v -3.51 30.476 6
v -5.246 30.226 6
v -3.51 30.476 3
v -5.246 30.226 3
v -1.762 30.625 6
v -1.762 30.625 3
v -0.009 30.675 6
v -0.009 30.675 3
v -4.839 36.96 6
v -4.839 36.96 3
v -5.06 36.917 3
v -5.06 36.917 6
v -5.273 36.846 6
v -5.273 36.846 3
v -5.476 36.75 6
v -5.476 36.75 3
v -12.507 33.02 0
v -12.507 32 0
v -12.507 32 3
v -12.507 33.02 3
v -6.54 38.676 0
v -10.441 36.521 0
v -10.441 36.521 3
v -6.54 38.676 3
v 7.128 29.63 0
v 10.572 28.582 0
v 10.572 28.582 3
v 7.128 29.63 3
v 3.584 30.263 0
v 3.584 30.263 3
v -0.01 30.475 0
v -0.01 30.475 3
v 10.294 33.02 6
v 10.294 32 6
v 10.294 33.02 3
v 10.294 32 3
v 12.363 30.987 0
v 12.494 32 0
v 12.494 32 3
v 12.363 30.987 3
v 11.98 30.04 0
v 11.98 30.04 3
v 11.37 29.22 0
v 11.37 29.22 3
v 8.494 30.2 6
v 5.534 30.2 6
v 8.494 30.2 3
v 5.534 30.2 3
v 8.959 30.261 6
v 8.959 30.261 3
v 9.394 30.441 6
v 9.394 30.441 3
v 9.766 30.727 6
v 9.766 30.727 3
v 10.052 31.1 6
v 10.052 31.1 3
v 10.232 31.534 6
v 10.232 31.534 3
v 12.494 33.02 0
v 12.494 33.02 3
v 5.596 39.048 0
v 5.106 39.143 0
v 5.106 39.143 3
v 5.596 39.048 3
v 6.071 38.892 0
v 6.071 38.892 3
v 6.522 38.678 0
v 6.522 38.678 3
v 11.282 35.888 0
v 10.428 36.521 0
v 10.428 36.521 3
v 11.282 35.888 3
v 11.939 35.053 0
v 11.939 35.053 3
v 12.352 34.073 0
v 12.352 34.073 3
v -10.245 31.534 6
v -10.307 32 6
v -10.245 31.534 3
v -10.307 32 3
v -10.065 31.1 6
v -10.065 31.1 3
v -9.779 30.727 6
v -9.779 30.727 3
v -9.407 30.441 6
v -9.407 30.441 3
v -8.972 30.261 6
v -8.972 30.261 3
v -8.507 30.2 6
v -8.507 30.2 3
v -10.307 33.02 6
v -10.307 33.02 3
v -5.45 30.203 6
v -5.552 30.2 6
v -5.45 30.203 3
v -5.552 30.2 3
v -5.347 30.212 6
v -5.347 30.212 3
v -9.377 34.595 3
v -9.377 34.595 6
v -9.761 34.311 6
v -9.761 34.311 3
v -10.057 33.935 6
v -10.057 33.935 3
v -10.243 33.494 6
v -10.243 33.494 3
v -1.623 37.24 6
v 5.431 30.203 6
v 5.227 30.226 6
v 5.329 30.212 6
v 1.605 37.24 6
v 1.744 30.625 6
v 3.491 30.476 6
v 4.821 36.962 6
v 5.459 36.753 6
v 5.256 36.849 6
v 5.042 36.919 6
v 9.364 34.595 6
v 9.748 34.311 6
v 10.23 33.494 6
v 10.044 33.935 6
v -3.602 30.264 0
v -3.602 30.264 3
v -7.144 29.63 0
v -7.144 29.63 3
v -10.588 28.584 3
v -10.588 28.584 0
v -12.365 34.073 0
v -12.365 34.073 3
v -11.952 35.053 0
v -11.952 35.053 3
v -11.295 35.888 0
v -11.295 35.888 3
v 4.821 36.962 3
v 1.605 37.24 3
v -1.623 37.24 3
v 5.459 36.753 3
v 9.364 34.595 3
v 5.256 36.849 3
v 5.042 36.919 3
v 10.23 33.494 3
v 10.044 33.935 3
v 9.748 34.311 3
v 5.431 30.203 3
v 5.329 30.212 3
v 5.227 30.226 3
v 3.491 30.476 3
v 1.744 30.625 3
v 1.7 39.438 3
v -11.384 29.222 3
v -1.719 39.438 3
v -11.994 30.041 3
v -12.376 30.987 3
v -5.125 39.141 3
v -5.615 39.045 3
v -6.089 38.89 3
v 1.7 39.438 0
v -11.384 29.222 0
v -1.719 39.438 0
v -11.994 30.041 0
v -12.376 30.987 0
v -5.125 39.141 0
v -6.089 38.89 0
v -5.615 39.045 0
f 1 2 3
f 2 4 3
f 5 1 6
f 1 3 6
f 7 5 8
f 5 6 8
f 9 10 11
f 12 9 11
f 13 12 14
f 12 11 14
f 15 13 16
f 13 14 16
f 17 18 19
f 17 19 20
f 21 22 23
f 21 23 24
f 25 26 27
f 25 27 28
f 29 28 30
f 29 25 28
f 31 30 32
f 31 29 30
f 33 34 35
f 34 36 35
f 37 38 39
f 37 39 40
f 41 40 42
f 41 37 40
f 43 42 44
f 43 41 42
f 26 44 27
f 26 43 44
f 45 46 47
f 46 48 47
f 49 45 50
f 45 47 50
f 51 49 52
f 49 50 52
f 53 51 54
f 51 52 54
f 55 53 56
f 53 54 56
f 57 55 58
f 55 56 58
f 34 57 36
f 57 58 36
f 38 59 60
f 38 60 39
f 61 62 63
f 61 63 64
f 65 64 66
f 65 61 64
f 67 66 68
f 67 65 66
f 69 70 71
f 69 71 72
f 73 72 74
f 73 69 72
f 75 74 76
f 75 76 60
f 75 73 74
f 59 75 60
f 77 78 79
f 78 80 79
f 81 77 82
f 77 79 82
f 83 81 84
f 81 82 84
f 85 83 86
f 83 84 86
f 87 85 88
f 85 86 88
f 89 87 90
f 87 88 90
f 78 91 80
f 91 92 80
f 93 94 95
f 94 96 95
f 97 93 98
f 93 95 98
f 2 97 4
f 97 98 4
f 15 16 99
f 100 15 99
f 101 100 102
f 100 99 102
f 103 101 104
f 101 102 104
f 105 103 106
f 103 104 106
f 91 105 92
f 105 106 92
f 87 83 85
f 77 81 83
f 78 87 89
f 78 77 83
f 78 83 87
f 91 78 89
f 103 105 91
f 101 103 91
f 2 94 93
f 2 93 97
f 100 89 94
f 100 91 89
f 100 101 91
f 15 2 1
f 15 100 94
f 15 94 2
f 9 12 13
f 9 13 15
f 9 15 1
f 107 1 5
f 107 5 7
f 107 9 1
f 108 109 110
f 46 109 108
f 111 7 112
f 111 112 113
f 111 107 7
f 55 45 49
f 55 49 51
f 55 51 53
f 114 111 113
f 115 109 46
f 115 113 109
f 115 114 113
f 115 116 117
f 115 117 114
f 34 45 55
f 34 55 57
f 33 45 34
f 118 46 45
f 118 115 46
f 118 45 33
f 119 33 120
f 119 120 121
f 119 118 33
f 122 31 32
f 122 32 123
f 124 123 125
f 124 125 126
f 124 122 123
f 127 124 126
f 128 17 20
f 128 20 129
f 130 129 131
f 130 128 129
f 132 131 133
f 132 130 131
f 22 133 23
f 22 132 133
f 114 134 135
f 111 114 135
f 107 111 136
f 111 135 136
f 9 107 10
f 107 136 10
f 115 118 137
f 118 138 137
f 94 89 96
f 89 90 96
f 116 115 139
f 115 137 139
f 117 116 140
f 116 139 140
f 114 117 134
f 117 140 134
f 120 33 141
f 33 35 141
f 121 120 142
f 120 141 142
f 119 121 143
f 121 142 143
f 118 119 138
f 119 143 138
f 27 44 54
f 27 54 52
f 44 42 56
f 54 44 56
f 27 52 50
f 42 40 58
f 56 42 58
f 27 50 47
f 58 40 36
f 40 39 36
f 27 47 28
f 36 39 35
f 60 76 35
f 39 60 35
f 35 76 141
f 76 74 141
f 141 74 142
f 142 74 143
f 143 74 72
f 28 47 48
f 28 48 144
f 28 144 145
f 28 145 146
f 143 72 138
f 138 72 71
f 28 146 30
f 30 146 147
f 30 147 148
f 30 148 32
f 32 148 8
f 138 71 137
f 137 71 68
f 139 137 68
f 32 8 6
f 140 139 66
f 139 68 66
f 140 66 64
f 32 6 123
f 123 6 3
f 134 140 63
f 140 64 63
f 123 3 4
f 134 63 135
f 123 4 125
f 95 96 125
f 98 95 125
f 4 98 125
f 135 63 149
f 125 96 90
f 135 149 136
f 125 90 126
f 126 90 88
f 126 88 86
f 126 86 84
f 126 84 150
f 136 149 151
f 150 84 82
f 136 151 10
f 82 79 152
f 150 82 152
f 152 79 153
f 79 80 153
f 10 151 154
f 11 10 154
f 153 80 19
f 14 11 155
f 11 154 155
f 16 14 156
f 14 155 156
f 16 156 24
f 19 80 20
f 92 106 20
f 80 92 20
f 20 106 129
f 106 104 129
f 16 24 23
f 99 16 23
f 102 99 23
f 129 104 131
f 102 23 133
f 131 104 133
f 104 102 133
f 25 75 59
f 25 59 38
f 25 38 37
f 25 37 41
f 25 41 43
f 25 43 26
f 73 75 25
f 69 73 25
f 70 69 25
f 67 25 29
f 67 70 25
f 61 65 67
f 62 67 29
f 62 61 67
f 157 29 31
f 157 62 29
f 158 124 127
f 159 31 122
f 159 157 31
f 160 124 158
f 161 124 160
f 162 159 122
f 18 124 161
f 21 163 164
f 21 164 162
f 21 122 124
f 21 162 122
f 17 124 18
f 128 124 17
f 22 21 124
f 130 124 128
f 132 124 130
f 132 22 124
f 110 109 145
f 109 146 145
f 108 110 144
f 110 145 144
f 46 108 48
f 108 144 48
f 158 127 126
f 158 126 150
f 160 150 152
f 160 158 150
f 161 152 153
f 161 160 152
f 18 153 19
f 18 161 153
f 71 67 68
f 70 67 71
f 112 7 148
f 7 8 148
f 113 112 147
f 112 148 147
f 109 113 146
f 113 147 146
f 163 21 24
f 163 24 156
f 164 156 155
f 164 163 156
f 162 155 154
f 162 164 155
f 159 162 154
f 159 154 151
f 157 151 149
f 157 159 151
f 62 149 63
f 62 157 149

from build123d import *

# Parameters (mm, degrees)
BOSS_EXTRUDE1_DEPTH = 5
BOSS_EXTRUDE2_DEPTH = 3
BOSS_EXTRUDE3_DEPTH = 1


with BuildPart() as part:
    # Sketch1 → Boss-Extrude1 (new body)
    with BuildSketch(Plane.XY):
        with BuildLine():
            Line((-5.475833864, 36.750373078), (-9.376960794, 34.595435627))
            ThreePointArc((-9.376960794, 34.595435627), (-10.056879686, 33.934547755), (-10.306619263, 33.019838718))
            Line((-10.306619263, 33.019838718), (-10.306619263, 31.999976553))
            ThreePointArc((-10.306619263, 31.999976553), (-9.779411469, 30.727184347), (-8.506619263, 30.199976553))
            Line((-8.506619263, 30.199976553), (-5.552402581, 30.199976553))
            ThreePointArc((-5.552402581, 30.199976553), (-5.398466912, 30.206570907), (-5.245659139, 30.226305653))
            ThreePointArc((-5.245659139, 30.226305653), (-2.637016879, 30.563008221), (-0.009120041, 30.674996011))
            ThreePointArc((-0.009120041, 30.674996011), (2.618776796, 30.563008221), (5.227419056, 30.226305653))
            ThreePointArc((5.227419056, 30.226305653), (5.380226829, 30.206570907), (5.534162498, 30.199976553))
            Line((5.534162498, 30.199976553), (8.493548715, 30.199976553))
            ThreePointArc((8.493548715, 30.199976553), (9.766340921, 30.727184347), (10.293548715, 31.999976553))
            Line((10.293548715, 31.999976553), (10.293548715, 33.019838718))
            ThreePointArc((10.293548715, 33.019838718), (10.043809137, 33.934547755), (9.363890246, 34.595435627))
            Line((9.363890246, 34.595435627), (5.458712815, 36.752610527))
            ThreePointArc((5.458712815, 36.752610527), (5.14978717, 36.887221852), (4.821185066, 36.961893934))
            ThreePointArc((4.821185066, 36.961893934), (-0.009071369, 37.274996263), (-4.839174836, 36.959542957))
            ThreePointArc((-4.839174836, 36.959542957), (-5.167324404, 36.884847724), (-5.475833864, 36.750373078))
        make_face()
    extrude(amount=BOSS_EXTRUDE1_DEPTH)

    # Sketch2 → Boss-Extrude2 (add)
    with BuildSketch(Plane(origin=(0, 0, 0), x_dir=(-1, 0, 0), z_dir=(0, 0, -1))):
        with BuildLine():
            ThreePointArc((10.587505912, 28.583851445), (11.993992673, 30.040837277), (12.506619263, 31.999976553))
            Line((12.506619263, 31.999976553), (12.506619263, 33.019838718))
            ThreePointArc((12.506619263, 33.019838718), (11.951642425, 35.052525467), (10.440711554, 36.521165182))
            Line((10.440711554, 36.521165182), (6.539584624, 38.676102633))
            ThreePointArc((6.539584624, 38.676102633), (5.854008048, 38.97493518), (5.124786785, 39.140924586))
            ThreePointArc((5.124786785, 39.140924586), (0.009606768, 39.474996197), (-5.105735244, 39.143414321))
            ThreePointArc((-5.105735244, 39.143414321), (-5.835962142, 38.97747636), (-6.522463575, 38.678340082))
            Line((-6.522463575, 38.678340082), (-10.427641006, 36.521165182))
            ThreePointArc((-10.427641006, 36.521165182), (-11.938571876, 35.052525467), (-12.493548715, 33.019838718))
            Line((-12.493548715, 33.019838718), (-12.493548715, 31.999976553))
            ThreePointArc((-12.493548715, 31.999976553), (-11.980256235, 30.039652429), (-10.57211338, 28.582438121))
            ThreePointArc((-10.57211338, 28.582438121), (-5.36535689, 29.998971577), (0.009611281, 30.474993977))
            ThreePointArc((0.009611281, 30.474993977), (5.382569695, 29.999329411), (10.587505912, 28.583851445))
        make_face()
        with BuildLine():
            ThreePointArc((-5.227419056, 30.226305653), (-5.380226829, 30.206570907), (-5.534162498, 30.199976553))
            Line((-5.534162498, 30.199976553), (-8.493548715, 30.199976553))
            ThreePointArc((-8.493548715, 30.199976553), (-9.766340921, 30.727184347), (-10.293548715, 31.999976553))
            Line((-10.293548715, 31.999976553), (-10.293548715, 33.019838718))
            ThreePointArc((-10.293548715, 33.019838718), (-10.043809137, 33.934547755), (-9.363890246, 34.595435627))
            Line((-9.363890246, 34.595435627), (-5.458712815, 36.752610527))
            ThreePointArc((-5.458712815, 36.752610527), (-5.14978717, 36.887221852), (-4.821185066, 36.961893934))
            ThreePointArc((-4.821185066, 36.961893934), (0.009071369, 37.274996263), (4.839174836, 36.959542957))
            ThreePointArc((4.839174836, 36.959542957), (5.167324404, 36.884847724), (5.475833864, 36.750373078))
            Line((5.475833864, 36.750373078), (9.376960794, 34.595435627))
            ThreePointArc((9.376960794, 34.595435627), (10.056879686, 33.934547755), (10.306619263, 33.019838718))
            Line((10.306619263, 33.019838718), (10.306619263, 31.999976553))
            ThreePointArc((10.306619263, 31.999976553), (9.779411469, 30.727184347), (8.506619263, 30.199976553))
            Line((8.506619263, 30.199976553), (5.552402581, 30.199976553))
            ThreePointArc((5.552402581, 30.199976553), (5.398466912, 30.206570907), (5.245659139, 30.226305653))
            ThreePointArc((5.245659139, 30.226305653), (2.637016879, 30.563008221), (0.009120041, 30.674996011))
            ThreePointArc((0.009120041, 30.674996011), (-2.618776796, 30.563008221), (-5.227419056, 30.226305653))
        make_face(mode=Mode.SUBTRACT)
    extrude(amount=-BOSS_EXTRUDE2_DEPTH)

    # Sketch6 → Boss-Extrude3 (add)
    with BuildSketch(Plane.XY.offset(5)):
        with BuildLine():
            Line((-5.475833864, 36.750373078), (-9.376960794, 34.595435627))
            ThreePointArc((-9.376960794, 34.595435627), (-10.056879686, 33.934547755), (-10.306619263, 33.019838718))
            Line((-10.306619263, 33.019838718), (-10.306619263, 31.999976553))
            ThreePointArc((-10.306619263, 31.999976553), (-9.779411469, 30.727184347), (-8.506619263, 30.199976553))
            Line((-8.506619263, 30.199976553), (-5.552402581, 30.199976553))
            ThreePointArc((-5.552402581, 30.199976553), (-5.398466912, 30.206570907), (-5.245659139, 30.226305653))
            ThreePointArc((-5.245659139, 30.226305653), (-2.637016879, 30.563008221), (-0.009120041, 30.674996011))
            ThreePointArc((-0.009120041, 30.674996011), (2.618776796, 30.563008221), (5.227419056, 30.226305653))
            ThreePointArc((5.227419056, 30.226305653), (5.380226829, 30.206570907), (5.534162498, 30.199976553))
            Line((5.534162498, 30.199976553), (8.493548715, 30.199976553))
            ThreePointArc((8.493548715, 30.199976553), (9.766340921, 30.727184347), (10.293548715, 31.999976553))
            Line((10.293548715, 31.999976553), (10.293548715, 33.019838718))
            ThreePointArc((10.293548715, 33.019838718), (10.043809137, 33.934547755), (9.363890246, 34.595435627))
            Line((9.363890246, 34.595435627), (5.458712815, 36.752610527))
            ThreePointArc((5.458712815, 36.752610527), (5.14978717, 36.887221852), (4.821185066, 36.961893934))
            ThreePointArc((4.821185066, 36.961893934), (-0.009071369, 37.274996263), (-4.839174836, 36.959542957))
            ThreePointArc((-4.839174836, 36.959542957), (-5.167324404, 36.884847724), (-5.475833864, 36.750373078))
        make_face()
    extrude(amount=BOSS_EXTRUDE3_DEPTH)


solid = part.part
